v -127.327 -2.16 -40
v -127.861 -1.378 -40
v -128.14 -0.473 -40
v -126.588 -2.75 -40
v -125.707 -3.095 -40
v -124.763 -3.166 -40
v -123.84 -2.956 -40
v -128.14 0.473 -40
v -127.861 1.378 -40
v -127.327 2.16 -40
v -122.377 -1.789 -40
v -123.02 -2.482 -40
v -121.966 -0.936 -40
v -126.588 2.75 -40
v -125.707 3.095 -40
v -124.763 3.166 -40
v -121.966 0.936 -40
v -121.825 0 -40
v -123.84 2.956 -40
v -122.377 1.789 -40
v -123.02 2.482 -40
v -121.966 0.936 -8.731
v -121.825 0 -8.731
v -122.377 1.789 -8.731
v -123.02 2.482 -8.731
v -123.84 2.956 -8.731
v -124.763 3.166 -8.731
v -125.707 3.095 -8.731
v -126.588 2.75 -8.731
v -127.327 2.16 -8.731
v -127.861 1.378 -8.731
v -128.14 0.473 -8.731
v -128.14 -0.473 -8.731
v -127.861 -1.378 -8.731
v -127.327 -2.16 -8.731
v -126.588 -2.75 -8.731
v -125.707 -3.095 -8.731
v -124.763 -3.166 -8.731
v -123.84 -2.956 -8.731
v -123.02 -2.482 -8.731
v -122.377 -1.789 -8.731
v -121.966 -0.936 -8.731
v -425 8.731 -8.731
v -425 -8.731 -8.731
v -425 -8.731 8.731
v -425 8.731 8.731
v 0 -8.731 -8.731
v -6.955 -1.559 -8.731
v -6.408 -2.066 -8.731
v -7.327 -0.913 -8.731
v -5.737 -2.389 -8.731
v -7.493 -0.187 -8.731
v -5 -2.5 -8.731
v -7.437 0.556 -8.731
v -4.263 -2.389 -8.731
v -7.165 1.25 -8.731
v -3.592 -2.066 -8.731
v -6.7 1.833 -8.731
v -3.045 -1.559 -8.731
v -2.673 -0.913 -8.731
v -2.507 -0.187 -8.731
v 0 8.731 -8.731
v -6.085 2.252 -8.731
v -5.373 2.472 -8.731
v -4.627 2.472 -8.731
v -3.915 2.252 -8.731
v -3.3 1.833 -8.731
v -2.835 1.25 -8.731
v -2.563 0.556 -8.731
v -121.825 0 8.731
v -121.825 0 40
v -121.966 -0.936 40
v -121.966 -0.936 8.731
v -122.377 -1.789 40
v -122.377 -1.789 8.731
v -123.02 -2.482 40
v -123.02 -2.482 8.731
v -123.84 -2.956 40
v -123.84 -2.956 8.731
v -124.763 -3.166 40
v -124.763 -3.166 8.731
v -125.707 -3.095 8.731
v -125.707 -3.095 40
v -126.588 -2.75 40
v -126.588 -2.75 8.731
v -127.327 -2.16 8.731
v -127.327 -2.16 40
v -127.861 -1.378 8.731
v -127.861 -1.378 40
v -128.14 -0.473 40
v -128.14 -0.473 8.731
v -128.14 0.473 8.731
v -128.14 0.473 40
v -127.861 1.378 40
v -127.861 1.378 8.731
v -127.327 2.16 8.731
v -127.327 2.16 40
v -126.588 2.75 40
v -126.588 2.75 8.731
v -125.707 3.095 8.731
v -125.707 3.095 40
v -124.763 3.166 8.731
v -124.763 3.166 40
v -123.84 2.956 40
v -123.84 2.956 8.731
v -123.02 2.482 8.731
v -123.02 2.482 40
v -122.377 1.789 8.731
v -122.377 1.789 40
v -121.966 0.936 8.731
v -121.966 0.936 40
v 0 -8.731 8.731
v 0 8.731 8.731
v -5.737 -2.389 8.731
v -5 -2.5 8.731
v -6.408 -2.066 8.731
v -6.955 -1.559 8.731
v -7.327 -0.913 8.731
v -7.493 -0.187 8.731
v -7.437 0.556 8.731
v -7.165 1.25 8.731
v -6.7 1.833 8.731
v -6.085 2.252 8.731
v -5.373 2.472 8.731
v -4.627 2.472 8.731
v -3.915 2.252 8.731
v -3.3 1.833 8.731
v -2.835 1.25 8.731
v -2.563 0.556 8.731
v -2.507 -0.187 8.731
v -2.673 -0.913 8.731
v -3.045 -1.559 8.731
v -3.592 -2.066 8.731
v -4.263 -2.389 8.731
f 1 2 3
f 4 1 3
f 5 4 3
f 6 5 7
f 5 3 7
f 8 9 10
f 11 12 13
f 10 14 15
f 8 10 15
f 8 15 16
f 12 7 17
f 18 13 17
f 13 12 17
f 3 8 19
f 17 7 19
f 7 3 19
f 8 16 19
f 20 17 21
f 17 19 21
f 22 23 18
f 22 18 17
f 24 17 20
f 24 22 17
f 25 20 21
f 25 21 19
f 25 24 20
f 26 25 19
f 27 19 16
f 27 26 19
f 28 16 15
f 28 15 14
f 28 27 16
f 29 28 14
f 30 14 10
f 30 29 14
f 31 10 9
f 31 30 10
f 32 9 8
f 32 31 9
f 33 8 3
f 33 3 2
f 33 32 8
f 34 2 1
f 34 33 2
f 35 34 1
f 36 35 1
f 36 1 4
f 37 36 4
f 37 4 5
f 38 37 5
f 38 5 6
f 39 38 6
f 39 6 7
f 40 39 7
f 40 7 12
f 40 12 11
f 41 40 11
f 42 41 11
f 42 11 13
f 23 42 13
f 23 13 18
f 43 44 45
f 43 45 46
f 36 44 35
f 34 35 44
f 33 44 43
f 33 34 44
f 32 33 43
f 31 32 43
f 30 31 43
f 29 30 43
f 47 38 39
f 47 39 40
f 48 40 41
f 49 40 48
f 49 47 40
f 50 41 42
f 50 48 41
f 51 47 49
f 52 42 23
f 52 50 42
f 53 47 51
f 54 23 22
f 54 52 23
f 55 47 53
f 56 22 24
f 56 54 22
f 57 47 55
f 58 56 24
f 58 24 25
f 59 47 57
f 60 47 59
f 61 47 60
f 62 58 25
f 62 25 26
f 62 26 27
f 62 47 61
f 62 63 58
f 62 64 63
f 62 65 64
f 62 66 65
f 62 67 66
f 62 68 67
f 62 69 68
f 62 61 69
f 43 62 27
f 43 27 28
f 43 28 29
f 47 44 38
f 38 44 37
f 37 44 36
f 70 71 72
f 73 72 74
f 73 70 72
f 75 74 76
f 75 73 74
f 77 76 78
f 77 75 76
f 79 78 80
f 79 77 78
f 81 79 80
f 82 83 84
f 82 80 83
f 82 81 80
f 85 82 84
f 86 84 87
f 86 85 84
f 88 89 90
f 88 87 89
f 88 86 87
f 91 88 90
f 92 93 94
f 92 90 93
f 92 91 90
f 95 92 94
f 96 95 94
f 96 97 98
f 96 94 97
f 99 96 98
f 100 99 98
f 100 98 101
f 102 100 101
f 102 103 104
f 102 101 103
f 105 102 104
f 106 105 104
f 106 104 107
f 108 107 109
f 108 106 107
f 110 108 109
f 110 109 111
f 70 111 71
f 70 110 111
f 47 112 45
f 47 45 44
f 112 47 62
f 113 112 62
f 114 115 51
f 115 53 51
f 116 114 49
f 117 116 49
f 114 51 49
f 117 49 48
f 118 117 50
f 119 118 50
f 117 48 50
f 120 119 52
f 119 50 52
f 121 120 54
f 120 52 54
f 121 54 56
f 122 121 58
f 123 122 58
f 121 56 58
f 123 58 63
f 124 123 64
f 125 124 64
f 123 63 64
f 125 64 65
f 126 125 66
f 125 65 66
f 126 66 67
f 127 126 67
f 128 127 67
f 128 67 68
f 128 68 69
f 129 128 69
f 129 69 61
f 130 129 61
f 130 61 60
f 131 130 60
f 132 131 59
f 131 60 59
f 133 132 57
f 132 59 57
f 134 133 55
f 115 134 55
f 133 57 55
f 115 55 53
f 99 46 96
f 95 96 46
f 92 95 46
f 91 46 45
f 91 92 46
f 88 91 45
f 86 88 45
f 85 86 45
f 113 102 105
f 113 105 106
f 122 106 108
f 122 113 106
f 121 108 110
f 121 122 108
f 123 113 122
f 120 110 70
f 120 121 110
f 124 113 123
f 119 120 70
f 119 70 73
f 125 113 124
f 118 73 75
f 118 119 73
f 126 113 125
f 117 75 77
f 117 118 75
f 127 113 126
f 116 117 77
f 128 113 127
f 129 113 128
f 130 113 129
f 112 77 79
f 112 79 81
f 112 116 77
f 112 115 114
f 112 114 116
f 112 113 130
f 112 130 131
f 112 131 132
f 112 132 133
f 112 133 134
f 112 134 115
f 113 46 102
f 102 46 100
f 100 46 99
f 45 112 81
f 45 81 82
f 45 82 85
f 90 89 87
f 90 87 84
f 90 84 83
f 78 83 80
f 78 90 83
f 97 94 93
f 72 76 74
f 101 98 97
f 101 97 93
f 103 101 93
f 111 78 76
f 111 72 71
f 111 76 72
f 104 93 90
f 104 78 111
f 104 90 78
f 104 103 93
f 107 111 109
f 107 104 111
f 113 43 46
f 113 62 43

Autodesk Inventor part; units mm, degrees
ref_plane "YZ Plane" through (0, 0, 0) normal (1, 0, 0) x (0, 1, 0)
ref_plane "XZ Plane" through (0, 0, 0) normal (0, 1, 0) x (-1, 0, 0)
sketch "Sketch1" plane through (0, 0, 0) normal (1, 0, 0) x (0, 1, 0)
  line L0 (8.7312, 8.7312) -> (-8.7312, 8.7312)
  line L1 (-8.7312, 8.7312) -> (-8.7313, -8.7313)
  line L2 (-8.7313, -8.7313) -> (8.7312, -8.7313)
  line L3 (8.7312, -8.7313) -> (8.7312, 8.7312)
  line L4 (8.7312, 8.7312) -> (-8.7313, -8.7313) construction
  line L5 (-8.7312, 8.7312) -> (8.7312, -8.7313) construction
  point P0 (0, 0)
  point P1 (0, 0)
  dimension "d9" = 17.4625
  dimension "d10" = 17.4625
extrude "Extrusion1" add sketch "Sketch1" against normal blind 425
ref_plane "Work Plane2" through (0, 0, 10) normal (0, 0, 1) x (1, 0, 0)
sketch "Sketch2" plane through (0, 0, 0) normal (0, 0, 1) x (1, 0, 0)
  circle A0 centre (-125, 0) radius 3.175
  line L0 (0, 8.7312) -> (0, -8.7312) construction
  line L1 (-425, 8.7312) -> (-425, -8.7313) construction
  point P0 (0, 0)
  dimension "d7" = 6.35
  dimension "d11" = 300
extrude "Extrusion2" add sketch "Sketch2" along normal mid plane 80
sketch "Sketch4" plane through (0, -8.7312, 8.7312) normal (0, 0, 1) x (1, 0, 0)
  circle A0 centre (-125, 8.7312) radius 3.175 construction
  point P0 (0, 8.7312)
  point P1 (-5, 8.7312)
  dimension "d14" = 120
hole "Hole1" at (-5, 0, 8.7312) direction (0, 0, -1) diameter 5 end through all
sketch "Sketch3" plane through (-125, 0, 40) normal (0, 0, 1) x (1, 0, 0)
  circle A0 centre (0, 0) radius 3.175 projected
  line L0 (-300, -8.7312) -> (-300, 8.7312) construction
  line L1 (125, 8.7312) -> (125, -8.7312) construction
  point P0 (125, 0)
  dimension "d12" = 300
  dimension "d13" = 125
equation "\"d11\" = LongArmLen"
equation "\"d14\" = ShortArmLen"
equation "\"LongArmLen\" = 300"
equation "\"ShortArmLen\" = 120"
properties part number "Long Arm"
